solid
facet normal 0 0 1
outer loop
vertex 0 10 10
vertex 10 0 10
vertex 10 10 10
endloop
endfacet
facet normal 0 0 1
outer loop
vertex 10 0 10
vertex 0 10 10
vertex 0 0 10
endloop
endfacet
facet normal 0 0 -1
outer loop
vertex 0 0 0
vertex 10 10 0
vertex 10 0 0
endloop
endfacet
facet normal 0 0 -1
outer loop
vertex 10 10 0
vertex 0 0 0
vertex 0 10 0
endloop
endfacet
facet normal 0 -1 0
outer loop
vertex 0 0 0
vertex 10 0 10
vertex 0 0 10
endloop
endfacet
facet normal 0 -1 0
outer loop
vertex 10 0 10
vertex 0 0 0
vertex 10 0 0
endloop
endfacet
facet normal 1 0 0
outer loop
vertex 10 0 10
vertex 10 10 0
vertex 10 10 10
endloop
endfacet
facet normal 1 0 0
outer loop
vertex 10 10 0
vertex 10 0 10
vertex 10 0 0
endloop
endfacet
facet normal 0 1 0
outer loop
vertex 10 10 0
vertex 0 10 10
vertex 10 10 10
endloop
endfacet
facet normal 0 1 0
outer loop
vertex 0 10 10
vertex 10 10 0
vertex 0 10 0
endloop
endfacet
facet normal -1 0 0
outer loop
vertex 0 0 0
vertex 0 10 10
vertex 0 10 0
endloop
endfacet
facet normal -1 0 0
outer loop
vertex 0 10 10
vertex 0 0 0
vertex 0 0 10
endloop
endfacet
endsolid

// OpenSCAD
// Ein einfacher Würfel
cube(10); // Erzeugt einen Würfel mit einer Kantenlänge von 10 Einheiten
